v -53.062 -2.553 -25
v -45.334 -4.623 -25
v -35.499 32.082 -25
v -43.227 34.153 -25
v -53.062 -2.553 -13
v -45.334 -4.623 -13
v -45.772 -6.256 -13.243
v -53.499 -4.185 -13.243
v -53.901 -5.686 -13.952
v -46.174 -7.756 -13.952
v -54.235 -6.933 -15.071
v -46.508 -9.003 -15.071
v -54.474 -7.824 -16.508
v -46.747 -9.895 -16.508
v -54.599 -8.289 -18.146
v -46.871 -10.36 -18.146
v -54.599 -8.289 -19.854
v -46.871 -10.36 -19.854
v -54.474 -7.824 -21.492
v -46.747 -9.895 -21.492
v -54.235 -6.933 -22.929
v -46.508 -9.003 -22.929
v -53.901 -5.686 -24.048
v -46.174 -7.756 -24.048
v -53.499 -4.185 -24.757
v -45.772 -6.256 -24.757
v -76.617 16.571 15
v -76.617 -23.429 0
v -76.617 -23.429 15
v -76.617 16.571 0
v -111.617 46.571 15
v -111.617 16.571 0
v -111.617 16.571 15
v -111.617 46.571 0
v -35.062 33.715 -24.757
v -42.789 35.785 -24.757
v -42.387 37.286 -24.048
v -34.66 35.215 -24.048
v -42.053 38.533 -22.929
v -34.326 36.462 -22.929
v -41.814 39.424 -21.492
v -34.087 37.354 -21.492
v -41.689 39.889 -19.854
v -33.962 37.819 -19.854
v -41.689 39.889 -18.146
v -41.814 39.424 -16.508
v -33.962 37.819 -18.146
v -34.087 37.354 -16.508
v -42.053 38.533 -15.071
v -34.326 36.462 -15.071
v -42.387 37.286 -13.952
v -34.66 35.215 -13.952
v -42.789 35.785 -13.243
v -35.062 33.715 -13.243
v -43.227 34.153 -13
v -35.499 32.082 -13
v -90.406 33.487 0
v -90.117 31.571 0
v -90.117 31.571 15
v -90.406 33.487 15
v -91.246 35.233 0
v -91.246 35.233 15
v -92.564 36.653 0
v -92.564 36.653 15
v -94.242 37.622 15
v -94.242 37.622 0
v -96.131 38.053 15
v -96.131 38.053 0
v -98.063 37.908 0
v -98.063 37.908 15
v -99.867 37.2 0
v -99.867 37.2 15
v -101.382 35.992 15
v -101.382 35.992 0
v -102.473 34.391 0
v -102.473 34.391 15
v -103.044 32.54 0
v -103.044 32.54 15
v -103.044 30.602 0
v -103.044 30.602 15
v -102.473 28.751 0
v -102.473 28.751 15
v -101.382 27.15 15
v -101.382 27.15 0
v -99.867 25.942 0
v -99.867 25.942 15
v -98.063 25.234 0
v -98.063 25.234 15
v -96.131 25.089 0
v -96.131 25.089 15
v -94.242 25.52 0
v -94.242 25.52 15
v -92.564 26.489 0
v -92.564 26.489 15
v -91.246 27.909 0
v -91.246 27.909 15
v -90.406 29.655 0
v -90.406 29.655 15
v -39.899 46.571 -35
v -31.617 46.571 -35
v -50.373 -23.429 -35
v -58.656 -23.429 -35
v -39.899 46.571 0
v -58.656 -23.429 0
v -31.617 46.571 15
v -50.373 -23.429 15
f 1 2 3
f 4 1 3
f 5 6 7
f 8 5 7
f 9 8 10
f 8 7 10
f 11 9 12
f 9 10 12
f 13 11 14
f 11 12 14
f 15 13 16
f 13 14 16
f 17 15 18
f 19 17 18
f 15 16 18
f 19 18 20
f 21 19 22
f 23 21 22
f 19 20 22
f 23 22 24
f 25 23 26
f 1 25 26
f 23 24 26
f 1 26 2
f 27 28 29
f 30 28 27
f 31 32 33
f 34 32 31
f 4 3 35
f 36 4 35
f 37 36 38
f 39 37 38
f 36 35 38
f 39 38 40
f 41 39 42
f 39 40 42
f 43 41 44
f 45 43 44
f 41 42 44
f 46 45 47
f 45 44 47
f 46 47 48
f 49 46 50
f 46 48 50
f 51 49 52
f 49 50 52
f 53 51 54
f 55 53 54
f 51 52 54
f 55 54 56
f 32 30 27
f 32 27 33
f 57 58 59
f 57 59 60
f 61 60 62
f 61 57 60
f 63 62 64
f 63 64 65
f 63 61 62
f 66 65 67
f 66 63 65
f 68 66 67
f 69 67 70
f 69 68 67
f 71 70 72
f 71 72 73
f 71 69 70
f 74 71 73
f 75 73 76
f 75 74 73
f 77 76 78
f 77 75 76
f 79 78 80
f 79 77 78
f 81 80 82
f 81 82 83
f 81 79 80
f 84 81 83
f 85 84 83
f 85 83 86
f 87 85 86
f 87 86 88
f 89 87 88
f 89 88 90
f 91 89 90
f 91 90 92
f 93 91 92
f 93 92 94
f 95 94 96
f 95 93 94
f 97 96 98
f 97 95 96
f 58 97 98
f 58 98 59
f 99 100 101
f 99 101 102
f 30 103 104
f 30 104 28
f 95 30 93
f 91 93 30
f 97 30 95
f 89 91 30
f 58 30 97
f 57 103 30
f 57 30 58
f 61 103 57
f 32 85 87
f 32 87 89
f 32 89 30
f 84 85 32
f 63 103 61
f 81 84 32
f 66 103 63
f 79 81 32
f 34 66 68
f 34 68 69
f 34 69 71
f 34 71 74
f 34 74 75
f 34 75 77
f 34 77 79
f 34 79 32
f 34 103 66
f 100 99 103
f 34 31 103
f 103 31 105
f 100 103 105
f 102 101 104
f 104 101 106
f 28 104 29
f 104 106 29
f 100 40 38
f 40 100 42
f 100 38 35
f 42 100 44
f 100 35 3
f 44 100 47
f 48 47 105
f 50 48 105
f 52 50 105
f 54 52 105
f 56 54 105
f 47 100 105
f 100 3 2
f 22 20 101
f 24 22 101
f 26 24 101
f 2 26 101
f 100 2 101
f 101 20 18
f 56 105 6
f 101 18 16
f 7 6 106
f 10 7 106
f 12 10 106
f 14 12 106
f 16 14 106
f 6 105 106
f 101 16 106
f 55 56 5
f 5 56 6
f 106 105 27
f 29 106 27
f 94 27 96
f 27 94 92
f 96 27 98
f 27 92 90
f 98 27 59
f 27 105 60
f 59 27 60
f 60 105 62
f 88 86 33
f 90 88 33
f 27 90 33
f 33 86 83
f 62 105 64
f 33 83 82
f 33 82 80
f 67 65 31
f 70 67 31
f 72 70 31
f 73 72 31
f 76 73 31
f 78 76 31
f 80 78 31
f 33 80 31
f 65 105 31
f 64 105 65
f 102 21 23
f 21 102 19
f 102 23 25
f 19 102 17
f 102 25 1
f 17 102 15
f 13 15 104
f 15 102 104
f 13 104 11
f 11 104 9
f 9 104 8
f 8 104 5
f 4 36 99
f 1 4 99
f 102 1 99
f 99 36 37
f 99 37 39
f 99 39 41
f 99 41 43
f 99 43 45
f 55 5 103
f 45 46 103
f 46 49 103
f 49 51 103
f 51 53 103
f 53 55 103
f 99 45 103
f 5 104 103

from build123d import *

# Parameters (mm, degrees)
ESBO_O1_R                = 6.5
RESSALTO_EXTRUS_O1_DEPTH = 15
RESSALTO_EXTRUS_O2_DEPTH = 35
CORTE_EXTRUS_O1_REACH    = 88.344


with BuildPart() as part:
    # Esboço1 → Ressalto-extrusão1 (new body)
    with BuildSketch(Plane.XY):
        Polygon((-31.616849906, 46.570948478), (-50.373293376, -23.429051522), (-76.616849906, -23.429051522), (-76.616849906, 16.570948478), (-111.616849906, 16.570948478), (-111.616849906, 46.570948478), align=None)
        with Locations((-96.616849906, 31.570948478)):
            Circle(ESBO_O1_R, mode=Mode.SUBTRACT)
    extrude(amount=RESSALTO_EXTRUS_O1_DEPTH)

    # Esboço2 → Ressalto-extrusão2 (add)
    with BuildSketch(Plane(origin=(0, 0, 0), x_dir=(-1, 0, 0), z_dir=(0, 0, -1))):
        Polygon((58.655502819, -23.429051522), (39.899059349, 46.570948478), (31.616849906, 46.570948478), (50.373293376, -23.429051522), align=None)
    extrude(amount=RESSALTO_EXTRUS_O2_DEPTH)

    # Esboço3 → Corte-extrusão1 (cut, up to next)
    with BuildSketch(Plane(origin=(-41.141659675, 11.023874485, 0), x_dir=(0, 0, -1), z_dir=(0.9659258262890673, -0.25881904510252474, 0)), mode=Mode.PRIVATE) as corte_extrus_o1_sk1:
        with BuildLine():
            Line((13, 21.801038988), (13, -16.198961012))
            ThreePointArc((13, -16.198961012), (19, -22.198961012), (25, -16.198961012))
            Line((25, -16.198961012), (25, 21.801038988))
            ThreePointArc((25, 21.801038988), (19, 27.801038988), (13, 21.801038988))
        make_face()
    corte_extrus_o1_tool1 = extrude(corte_extrus_o1_sk1.sketch, amount=-CORTE_EXTRUS_O1_REACH, mode=Mode.PRIVATE) & part.part
    add(corte_extrus_o1_tool1.solids().sort_by_distance((-40.416697, 13.72947, -19))[0], mode=Mode.SUBTRACT)


solid = part.part
